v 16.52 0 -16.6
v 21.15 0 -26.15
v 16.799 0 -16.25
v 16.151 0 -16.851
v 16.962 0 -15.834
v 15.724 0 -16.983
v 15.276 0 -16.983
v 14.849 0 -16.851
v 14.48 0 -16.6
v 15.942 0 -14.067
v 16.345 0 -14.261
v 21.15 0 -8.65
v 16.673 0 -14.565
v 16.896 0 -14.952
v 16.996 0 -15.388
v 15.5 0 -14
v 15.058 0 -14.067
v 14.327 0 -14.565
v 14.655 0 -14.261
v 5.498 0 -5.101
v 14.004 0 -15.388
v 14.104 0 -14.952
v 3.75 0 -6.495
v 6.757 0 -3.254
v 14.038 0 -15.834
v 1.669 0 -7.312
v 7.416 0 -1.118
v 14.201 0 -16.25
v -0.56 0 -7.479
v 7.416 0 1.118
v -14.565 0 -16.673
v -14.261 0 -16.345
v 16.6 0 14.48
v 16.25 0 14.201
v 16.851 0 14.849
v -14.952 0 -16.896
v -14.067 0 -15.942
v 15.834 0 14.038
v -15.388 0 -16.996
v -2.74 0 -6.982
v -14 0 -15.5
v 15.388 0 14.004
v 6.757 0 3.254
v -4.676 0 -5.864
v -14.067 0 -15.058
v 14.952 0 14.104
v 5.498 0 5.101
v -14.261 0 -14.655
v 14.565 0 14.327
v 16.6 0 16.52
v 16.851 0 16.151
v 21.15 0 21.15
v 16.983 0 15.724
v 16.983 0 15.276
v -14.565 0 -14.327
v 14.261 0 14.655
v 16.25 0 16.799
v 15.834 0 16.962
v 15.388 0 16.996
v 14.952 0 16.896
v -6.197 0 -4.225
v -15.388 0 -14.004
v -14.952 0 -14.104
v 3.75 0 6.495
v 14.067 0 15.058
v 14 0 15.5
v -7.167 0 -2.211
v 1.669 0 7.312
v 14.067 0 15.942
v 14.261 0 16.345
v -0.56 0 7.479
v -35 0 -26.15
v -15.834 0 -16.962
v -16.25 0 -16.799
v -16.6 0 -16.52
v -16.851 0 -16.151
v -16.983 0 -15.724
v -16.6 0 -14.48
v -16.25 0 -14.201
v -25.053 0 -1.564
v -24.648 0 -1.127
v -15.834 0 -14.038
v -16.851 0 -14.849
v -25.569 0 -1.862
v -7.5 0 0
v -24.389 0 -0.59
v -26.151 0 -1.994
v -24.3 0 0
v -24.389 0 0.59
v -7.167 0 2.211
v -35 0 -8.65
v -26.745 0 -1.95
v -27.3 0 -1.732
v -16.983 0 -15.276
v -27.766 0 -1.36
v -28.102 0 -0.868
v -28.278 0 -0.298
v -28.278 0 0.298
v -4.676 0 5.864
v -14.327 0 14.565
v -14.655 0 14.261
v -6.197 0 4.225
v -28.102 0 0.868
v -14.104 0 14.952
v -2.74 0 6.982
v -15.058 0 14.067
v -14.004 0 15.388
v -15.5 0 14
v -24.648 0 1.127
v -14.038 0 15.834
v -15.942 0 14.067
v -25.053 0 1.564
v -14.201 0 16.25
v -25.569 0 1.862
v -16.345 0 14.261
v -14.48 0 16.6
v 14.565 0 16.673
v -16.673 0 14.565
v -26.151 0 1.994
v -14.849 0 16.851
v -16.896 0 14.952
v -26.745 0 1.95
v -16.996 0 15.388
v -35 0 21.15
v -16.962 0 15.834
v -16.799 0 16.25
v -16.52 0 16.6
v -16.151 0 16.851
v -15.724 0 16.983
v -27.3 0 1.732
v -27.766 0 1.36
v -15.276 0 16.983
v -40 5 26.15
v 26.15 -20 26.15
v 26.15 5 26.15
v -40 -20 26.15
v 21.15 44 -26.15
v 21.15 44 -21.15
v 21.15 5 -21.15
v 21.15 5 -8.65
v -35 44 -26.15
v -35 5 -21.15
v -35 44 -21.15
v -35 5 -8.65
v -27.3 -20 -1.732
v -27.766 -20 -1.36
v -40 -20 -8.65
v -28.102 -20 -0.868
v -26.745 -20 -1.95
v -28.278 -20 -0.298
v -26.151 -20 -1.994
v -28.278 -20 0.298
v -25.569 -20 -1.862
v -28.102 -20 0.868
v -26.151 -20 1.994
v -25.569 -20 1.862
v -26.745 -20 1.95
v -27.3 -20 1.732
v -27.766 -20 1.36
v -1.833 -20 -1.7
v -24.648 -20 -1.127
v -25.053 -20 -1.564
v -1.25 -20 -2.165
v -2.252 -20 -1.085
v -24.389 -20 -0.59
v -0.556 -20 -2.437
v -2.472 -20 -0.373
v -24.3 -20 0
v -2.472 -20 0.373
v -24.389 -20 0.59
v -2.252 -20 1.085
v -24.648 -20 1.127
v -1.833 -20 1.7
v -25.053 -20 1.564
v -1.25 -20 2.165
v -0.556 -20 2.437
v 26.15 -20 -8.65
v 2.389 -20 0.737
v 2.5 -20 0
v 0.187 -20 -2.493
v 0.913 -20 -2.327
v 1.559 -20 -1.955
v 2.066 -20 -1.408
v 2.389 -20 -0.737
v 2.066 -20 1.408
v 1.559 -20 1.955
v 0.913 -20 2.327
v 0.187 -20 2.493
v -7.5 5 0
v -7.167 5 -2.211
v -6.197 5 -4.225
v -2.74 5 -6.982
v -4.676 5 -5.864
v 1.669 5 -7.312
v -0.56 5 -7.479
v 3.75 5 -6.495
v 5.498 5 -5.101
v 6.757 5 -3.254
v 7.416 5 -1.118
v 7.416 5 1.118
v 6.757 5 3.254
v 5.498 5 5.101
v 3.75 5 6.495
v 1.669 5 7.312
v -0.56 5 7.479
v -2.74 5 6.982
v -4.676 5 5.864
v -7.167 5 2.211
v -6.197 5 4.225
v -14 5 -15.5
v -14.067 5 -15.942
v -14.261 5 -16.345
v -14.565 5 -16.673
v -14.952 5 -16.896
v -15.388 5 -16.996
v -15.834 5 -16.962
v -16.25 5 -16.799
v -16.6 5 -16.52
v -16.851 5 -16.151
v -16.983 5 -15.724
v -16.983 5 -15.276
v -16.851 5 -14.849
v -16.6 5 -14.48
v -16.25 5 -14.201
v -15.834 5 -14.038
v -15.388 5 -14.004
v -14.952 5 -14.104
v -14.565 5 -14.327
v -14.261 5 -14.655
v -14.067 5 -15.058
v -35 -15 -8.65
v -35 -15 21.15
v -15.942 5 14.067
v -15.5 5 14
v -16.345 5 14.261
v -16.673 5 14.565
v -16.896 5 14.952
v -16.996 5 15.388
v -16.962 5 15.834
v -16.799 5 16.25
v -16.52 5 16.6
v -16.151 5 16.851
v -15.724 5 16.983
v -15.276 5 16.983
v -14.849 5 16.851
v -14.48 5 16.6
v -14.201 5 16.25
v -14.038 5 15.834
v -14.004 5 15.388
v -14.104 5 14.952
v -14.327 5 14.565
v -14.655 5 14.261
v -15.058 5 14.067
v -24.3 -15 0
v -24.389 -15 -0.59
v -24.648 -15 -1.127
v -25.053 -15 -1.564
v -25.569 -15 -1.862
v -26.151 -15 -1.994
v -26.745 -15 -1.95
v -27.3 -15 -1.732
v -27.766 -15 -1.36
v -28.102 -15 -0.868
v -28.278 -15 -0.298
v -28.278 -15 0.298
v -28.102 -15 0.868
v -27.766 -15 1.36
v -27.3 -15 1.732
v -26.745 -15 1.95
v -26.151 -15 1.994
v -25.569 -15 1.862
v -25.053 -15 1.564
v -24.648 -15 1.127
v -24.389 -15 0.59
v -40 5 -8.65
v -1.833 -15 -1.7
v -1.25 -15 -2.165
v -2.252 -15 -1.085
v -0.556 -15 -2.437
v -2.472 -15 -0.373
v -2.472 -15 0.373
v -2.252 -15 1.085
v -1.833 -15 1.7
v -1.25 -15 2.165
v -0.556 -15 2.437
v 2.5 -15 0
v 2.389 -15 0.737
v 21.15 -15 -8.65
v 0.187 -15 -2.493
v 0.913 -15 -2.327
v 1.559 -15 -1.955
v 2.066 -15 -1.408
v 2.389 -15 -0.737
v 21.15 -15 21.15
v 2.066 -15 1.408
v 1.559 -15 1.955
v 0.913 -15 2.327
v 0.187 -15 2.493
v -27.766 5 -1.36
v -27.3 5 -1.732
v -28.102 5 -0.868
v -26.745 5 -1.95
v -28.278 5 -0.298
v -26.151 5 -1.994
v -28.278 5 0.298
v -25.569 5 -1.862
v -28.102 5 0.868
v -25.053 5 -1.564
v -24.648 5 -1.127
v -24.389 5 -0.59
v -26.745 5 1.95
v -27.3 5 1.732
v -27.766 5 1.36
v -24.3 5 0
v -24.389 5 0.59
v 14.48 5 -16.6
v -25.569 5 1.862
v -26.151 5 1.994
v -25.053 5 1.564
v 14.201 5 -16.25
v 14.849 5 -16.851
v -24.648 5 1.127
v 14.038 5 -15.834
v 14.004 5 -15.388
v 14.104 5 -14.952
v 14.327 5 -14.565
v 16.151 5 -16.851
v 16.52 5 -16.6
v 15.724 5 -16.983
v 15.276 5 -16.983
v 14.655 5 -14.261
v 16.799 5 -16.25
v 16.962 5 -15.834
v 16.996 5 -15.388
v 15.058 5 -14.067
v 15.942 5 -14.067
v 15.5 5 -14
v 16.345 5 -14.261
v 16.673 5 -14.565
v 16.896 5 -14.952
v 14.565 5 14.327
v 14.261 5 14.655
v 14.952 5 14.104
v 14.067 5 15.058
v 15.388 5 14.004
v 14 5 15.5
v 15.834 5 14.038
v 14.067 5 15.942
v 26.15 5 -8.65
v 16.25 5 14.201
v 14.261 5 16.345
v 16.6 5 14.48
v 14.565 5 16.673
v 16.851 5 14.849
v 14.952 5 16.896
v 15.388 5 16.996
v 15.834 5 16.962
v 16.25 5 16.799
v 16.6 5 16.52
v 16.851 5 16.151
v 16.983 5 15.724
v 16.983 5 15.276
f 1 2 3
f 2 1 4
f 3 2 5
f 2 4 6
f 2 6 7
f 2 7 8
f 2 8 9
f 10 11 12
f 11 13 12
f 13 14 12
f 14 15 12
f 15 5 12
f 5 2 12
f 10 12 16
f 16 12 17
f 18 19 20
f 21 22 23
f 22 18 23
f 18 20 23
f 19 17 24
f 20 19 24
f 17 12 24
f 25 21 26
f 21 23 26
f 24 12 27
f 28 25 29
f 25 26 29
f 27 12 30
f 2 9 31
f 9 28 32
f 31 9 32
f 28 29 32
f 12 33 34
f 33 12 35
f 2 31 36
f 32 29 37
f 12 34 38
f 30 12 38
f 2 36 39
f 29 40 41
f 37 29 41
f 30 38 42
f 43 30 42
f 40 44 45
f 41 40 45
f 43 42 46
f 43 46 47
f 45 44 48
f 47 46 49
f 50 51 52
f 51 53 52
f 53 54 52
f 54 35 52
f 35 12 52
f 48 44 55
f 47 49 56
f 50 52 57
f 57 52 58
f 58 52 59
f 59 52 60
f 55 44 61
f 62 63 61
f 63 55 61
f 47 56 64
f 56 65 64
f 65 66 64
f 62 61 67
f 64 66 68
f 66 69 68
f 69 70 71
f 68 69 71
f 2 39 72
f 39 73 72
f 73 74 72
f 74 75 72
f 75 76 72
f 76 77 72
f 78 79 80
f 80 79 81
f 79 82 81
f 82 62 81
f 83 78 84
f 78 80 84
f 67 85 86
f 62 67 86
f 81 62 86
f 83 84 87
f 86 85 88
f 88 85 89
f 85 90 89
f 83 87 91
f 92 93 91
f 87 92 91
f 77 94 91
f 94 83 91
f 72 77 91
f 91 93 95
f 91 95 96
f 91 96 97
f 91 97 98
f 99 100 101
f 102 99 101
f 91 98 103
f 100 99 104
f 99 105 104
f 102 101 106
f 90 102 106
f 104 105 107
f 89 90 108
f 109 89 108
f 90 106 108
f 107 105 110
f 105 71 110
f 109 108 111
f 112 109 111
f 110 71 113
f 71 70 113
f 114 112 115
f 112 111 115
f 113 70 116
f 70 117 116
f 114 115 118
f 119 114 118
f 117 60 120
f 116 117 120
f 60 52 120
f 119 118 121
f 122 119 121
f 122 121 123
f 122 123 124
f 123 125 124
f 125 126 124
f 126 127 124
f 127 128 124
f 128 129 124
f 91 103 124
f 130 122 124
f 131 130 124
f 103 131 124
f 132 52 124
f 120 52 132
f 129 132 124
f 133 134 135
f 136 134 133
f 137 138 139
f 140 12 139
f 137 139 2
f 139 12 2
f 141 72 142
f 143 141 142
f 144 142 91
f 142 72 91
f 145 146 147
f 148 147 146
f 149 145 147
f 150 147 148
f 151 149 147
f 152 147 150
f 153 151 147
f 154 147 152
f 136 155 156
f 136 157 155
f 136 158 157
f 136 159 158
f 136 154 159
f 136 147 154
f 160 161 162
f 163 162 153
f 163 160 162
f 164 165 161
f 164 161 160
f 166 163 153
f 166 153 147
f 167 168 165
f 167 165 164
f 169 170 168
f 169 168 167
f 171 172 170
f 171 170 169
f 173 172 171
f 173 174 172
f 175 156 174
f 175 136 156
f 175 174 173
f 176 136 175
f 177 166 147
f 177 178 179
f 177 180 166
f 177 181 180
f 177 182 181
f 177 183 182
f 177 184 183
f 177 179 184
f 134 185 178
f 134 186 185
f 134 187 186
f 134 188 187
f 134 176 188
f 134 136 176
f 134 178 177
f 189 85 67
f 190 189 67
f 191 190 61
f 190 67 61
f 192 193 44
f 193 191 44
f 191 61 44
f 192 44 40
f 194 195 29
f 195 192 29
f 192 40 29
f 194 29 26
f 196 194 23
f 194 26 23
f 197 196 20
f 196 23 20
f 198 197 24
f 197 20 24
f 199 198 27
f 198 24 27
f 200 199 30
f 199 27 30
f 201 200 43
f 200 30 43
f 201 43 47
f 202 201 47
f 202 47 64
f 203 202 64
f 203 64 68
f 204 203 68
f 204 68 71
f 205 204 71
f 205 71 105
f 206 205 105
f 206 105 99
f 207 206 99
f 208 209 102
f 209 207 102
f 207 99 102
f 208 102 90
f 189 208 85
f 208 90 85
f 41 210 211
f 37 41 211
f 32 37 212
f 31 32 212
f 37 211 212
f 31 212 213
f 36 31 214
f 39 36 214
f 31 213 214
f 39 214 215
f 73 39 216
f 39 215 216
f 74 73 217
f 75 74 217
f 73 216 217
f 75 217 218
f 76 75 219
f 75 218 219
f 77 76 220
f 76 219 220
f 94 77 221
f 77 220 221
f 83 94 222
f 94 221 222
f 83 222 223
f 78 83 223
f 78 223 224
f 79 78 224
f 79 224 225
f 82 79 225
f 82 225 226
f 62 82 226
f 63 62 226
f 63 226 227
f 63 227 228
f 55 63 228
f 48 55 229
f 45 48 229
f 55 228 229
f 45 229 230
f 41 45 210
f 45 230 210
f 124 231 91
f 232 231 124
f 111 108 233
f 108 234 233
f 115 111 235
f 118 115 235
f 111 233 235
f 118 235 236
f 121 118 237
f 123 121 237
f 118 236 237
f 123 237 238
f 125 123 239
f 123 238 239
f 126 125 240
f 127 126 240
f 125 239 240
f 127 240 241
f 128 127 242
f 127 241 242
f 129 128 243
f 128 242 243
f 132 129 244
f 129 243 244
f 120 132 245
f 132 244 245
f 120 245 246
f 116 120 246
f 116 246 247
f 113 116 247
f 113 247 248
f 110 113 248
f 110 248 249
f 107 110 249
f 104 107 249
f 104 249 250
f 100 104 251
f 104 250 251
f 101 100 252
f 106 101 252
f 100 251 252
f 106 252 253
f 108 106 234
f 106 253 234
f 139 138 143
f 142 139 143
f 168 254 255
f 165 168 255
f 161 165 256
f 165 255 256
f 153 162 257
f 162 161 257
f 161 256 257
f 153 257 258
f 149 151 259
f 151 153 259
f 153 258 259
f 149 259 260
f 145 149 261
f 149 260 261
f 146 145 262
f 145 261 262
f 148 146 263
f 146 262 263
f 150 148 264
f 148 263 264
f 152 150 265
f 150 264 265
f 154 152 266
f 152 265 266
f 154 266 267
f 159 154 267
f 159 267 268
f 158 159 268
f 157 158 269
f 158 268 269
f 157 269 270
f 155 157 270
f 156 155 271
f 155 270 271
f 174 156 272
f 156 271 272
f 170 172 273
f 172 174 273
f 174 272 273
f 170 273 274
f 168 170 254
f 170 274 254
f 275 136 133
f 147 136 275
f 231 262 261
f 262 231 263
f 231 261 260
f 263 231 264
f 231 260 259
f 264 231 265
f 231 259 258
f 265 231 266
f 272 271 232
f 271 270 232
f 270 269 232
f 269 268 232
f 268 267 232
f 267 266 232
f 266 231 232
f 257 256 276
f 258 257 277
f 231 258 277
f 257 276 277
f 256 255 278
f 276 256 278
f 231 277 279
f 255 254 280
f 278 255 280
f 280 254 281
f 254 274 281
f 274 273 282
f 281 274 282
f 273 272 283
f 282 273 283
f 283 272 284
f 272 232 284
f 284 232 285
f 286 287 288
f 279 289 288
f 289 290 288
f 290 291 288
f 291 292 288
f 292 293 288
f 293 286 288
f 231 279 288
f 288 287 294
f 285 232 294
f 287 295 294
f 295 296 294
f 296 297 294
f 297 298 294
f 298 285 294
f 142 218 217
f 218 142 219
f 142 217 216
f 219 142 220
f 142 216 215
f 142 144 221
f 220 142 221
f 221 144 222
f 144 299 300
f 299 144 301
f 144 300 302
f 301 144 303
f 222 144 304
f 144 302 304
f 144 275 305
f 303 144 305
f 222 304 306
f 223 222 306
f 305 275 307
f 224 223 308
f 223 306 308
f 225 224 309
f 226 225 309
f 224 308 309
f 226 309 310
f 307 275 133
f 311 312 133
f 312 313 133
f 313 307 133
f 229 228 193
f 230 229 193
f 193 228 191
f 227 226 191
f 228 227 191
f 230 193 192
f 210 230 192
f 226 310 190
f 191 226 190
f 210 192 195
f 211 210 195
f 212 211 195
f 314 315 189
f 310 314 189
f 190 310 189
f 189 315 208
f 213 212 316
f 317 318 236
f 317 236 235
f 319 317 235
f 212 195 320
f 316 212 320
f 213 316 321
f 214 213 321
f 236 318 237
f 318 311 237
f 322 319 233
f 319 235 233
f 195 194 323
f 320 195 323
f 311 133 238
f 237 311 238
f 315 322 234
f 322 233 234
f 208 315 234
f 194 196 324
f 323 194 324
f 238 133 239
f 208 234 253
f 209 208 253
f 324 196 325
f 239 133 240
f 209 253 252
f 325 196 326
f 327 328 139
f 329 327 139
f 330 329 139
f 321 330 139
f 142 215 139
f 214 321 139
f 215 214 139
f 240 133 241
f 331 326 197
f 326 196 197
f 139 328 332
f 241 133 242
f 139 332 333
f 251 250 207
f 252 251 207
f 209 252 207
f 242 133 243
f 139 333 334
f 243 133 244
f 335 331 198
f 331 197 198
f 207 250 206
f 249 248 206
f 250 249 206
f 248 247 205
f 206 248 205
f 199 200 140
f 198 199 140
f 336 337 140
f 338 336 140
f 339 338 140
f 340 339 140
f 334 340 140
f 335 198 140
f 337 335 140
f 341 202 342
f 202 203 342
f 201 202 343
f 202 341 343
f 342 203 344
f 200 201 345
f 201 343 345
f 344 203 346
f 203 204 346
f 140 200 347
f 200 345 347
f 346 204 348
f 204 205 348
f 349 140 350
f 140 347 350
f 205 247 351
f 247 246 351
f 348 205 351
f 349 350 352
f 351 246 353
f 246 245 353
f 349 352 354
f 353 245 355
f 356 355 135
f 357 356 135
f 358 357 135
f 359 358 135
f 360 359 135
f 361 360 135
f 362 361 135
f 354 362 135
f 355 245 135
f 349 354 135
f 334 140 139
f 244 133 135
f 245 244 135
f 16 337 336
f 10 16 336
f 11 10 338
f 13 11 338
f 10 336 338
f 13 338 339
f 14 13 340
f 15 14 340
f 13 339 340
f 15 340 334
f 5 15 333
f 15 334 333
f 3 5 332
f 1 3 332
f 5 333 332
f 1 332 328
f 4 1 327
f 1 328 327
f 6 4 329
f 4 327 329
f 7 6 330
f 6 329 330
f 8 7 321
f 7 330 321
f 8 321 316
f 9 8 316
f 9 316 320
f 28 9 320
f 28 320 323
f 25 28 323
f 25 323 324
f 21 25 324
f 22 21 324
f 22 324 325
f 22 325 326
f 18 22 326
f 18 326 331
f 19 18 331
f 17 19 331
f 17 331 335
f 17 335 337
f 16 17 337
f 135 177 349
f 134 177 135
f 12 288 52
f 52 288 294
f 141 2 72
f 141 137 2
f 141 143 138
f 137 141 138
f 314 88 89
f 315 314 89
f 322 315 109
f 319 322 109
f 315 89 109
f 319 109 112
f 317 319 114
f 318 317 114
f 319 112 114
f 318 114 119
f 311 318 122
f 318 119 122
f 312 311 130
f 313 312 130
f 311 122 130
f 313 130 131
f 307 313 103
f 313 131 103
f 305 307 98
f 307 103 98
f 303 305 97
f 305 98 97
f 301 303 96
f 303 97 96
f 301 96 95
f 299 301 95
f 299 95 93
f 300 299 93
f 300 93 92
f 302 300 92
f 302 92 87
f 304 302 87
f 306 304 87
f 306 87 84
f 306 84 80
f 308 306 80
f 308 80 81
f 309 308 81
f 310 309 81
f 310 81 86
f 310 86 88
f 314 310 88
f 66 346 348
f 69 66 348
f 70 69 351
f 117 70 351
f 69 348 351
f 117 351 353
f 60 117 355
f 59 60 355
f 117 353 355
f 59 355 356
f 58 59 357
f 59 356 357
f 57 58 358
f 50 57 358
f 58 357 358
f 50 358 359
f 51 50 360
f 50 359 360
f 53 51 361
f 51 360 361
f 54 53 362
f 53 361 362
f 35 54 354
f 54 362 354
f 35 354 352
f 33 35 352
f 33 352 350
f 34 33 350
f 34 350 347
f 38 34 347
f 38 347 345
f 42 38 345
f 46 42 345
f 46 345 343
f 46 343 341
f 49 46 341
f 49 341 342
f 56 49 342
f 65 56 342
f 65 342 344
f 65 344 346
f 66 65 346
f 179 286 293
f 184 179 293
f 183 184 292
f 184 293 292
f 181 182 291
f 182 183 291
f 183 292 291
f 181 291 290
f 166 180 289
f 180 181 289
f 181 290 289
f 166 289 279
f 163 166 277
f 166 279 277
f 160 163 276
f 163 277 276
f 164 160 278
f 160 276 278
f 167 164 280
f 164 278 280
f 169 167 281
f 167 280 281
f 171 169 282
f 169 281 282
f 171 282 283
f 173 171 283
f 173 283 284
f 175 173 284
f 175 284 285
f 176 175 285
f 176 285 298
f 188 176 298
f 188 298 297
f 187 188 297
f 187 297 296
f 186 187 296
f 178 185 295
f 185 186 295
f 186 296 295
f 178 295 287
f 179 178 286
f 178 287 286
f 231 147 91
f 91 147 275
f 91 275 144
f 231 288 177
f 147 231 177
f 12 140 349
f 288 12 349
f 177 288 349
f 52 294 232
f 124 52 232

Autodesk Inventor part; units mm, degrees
ref_plane "YZ Plane" through (0, 0, 0) normal (1, 0, 0) x (0, 1, 0)
ref_plane "XZ Plane" through (0, 0, 0) normal (0, 1, 0) x (-1, 0, 0)
sketch "Boceto1" plane through (0, 0, 0) normal (0, 1, 0) x (-1, 0, 0)
  line L0 (21.15, 21.15) -> (-21.15, 21.15)
  line L1 (-21.15, 21.15) -> (-21.15, -21.15)
  line L2 (-21.15, -21.15) -> (21.15, -21.15)
  line L3 (21.15, -21.15) -> (21.15, 21.15)
  line L4 (0, 0) -> (3.2885, 0)
  line L5 (0, 0) -> (0, -4.7563)
  circle A0 centre (0, 0) radius 7.5
  line L6 (21.15, -21.15) -> (35, -21.15)
  line L7 (35, -21.15) -> (35, 21.15)
  line L8 (35, 21.15) -> (21.15, 21.15)
  line L9 (21.15, 21.15) -> (21.15, -21.15)
  dimension "d0" = 42.3
  dimension "d1" = 42.3
  dimension "d26" = 15
  dimension "d35" = 35
extrude "Extrusión1" add sketch "Boceto1" along normal blind 5
sketch "Boceto2" plane through (0, 5, 0) normal (0, 1, 0) x (1, 0, 0)
  circle A0 centre (-15.5, 15.5) radius 1.5
  point P0 (0, 0)
  dimension "d4" = 3
  dimension "d5" = 15.5
  dimension "d6" = 15.5
extrude "Extrusión2" cut sketch "Boceto2" against normal through all
pattern_circular "Patrón circular1" count 4 over 360 about axis through (0, -10, 0) along (0, 1, 0) of "Extrusión2"
sketch "Boceto7" plane through (0, 0, 0) normal (0, -1, 0) x (1, 0, 0)
  circle A0 centre (-26.3, 0) radius 2
  point P0 (0, 0)
  dimension "d31" = 4
  dimension "d32" = 26.3
extrude "Extrusión7" cut sketch "Boceto7" against normal through all
sketch "Boceto8" plane through (21.15, 0, -21.15) normal (0, 0, -1) x (-1, 0, 0)
  line L0 (0, 0) -> (0, 5) projected
  line L1 (0, 0) -> (56.15, 0)
  line L2 (56.15, 0) -> (56.15, 44)
  line L3 (56.15, 44) -> (0, 44)
  line L4 (0, 44) -> (0, 0)
  line L5 (0, 5) -> (56.15, 5) projected
  point P0 (21.15, 0)
  dimension "d36" = 39
extrude "Extrusión8" add sketch "Boceto8" along normal blind 5
ref_plane "Plano de trabajo1" through (0, -15, 0) normal (0, -1, 0) x (1, 0, 0)
sketch "Boceto9" plane through (0, -15, 0) normal (0, -1, 0) x (1, 0, 0)
  line L0 (21.15, 21.15) -> (21.15, -26.15) projected
  line L1 (-35, 21.15) -> (21.15, 21.15) projected
  line L2 (-35, 21.15) -> (-35, -26.15) projected
  circle A0 centre (0, 0) radius 2.5
  circle A1 centre (-26.3, 0) radius 2
  line L3 (-35, -21.15) -> (-35, 21.15) projected
  line L4 (21.15, -26.15) -> (-35, -26.15)
  line L5 (-35, -26.15) -> (-35, -8.65)
  line L6 (-35, -8.65) -> (21.15, -8.65)
  line L7 (21.15, -8.65) -> (21.15, -26.15)
  point P0 (-35, -26.15)
  point P1 (21.15, -8.65)
  dimension "d45" = 5
  dimension "d46" = 17.5
extrude "Extrusión9" add sketch "Boceto9" along normal blind 5 contours L0 L6 L2 L1
sketch "Boceto10" plane through (0, -20, 0) normal (0, -1, 0) x (1, 0, 0)
  line L0 (-35, -8.65) -> (21.15, -8.65) projected
  line L1 (21.15, -8.65) -> (26.15, -8.65)
  line L2 (26.15, -8.65) -> (26.15, 26.15)
  line L3 (26.15, 26.15) -> (-40, 26.15)
  line L4 (-40, 26.15) -> (-40, -8.65)
  line L5 (-40, -8.65) -> (-35, -8.65)
  line L6 (-35, -21.15) -> (-35, 21.15) projected
  line L7 (21.15, 21.15) -> (-35, 21.15) projected
  line L8 (21.15, -8.65) -> (21.15, 21.15) projected
  line L9 (-35, 21.15) -> (-35, -8.65) projected
  point P0 (0, 0)
  dimension "d47" = 5
  dimension "d48" = 5
  dimension "d49" = 5
extrude "Extrusión10" add sketch "Boceto10" against normal up to surface (25 mm away) contours L5 L4 L3 L2 L1 L8 L7 L6
equation "\"d0\" = d1"
equation "\"d6\" = d5"
equation "\"d48\" = d47"
equation "\"d49\" = d47"
properties part number "Base Motor X1"
